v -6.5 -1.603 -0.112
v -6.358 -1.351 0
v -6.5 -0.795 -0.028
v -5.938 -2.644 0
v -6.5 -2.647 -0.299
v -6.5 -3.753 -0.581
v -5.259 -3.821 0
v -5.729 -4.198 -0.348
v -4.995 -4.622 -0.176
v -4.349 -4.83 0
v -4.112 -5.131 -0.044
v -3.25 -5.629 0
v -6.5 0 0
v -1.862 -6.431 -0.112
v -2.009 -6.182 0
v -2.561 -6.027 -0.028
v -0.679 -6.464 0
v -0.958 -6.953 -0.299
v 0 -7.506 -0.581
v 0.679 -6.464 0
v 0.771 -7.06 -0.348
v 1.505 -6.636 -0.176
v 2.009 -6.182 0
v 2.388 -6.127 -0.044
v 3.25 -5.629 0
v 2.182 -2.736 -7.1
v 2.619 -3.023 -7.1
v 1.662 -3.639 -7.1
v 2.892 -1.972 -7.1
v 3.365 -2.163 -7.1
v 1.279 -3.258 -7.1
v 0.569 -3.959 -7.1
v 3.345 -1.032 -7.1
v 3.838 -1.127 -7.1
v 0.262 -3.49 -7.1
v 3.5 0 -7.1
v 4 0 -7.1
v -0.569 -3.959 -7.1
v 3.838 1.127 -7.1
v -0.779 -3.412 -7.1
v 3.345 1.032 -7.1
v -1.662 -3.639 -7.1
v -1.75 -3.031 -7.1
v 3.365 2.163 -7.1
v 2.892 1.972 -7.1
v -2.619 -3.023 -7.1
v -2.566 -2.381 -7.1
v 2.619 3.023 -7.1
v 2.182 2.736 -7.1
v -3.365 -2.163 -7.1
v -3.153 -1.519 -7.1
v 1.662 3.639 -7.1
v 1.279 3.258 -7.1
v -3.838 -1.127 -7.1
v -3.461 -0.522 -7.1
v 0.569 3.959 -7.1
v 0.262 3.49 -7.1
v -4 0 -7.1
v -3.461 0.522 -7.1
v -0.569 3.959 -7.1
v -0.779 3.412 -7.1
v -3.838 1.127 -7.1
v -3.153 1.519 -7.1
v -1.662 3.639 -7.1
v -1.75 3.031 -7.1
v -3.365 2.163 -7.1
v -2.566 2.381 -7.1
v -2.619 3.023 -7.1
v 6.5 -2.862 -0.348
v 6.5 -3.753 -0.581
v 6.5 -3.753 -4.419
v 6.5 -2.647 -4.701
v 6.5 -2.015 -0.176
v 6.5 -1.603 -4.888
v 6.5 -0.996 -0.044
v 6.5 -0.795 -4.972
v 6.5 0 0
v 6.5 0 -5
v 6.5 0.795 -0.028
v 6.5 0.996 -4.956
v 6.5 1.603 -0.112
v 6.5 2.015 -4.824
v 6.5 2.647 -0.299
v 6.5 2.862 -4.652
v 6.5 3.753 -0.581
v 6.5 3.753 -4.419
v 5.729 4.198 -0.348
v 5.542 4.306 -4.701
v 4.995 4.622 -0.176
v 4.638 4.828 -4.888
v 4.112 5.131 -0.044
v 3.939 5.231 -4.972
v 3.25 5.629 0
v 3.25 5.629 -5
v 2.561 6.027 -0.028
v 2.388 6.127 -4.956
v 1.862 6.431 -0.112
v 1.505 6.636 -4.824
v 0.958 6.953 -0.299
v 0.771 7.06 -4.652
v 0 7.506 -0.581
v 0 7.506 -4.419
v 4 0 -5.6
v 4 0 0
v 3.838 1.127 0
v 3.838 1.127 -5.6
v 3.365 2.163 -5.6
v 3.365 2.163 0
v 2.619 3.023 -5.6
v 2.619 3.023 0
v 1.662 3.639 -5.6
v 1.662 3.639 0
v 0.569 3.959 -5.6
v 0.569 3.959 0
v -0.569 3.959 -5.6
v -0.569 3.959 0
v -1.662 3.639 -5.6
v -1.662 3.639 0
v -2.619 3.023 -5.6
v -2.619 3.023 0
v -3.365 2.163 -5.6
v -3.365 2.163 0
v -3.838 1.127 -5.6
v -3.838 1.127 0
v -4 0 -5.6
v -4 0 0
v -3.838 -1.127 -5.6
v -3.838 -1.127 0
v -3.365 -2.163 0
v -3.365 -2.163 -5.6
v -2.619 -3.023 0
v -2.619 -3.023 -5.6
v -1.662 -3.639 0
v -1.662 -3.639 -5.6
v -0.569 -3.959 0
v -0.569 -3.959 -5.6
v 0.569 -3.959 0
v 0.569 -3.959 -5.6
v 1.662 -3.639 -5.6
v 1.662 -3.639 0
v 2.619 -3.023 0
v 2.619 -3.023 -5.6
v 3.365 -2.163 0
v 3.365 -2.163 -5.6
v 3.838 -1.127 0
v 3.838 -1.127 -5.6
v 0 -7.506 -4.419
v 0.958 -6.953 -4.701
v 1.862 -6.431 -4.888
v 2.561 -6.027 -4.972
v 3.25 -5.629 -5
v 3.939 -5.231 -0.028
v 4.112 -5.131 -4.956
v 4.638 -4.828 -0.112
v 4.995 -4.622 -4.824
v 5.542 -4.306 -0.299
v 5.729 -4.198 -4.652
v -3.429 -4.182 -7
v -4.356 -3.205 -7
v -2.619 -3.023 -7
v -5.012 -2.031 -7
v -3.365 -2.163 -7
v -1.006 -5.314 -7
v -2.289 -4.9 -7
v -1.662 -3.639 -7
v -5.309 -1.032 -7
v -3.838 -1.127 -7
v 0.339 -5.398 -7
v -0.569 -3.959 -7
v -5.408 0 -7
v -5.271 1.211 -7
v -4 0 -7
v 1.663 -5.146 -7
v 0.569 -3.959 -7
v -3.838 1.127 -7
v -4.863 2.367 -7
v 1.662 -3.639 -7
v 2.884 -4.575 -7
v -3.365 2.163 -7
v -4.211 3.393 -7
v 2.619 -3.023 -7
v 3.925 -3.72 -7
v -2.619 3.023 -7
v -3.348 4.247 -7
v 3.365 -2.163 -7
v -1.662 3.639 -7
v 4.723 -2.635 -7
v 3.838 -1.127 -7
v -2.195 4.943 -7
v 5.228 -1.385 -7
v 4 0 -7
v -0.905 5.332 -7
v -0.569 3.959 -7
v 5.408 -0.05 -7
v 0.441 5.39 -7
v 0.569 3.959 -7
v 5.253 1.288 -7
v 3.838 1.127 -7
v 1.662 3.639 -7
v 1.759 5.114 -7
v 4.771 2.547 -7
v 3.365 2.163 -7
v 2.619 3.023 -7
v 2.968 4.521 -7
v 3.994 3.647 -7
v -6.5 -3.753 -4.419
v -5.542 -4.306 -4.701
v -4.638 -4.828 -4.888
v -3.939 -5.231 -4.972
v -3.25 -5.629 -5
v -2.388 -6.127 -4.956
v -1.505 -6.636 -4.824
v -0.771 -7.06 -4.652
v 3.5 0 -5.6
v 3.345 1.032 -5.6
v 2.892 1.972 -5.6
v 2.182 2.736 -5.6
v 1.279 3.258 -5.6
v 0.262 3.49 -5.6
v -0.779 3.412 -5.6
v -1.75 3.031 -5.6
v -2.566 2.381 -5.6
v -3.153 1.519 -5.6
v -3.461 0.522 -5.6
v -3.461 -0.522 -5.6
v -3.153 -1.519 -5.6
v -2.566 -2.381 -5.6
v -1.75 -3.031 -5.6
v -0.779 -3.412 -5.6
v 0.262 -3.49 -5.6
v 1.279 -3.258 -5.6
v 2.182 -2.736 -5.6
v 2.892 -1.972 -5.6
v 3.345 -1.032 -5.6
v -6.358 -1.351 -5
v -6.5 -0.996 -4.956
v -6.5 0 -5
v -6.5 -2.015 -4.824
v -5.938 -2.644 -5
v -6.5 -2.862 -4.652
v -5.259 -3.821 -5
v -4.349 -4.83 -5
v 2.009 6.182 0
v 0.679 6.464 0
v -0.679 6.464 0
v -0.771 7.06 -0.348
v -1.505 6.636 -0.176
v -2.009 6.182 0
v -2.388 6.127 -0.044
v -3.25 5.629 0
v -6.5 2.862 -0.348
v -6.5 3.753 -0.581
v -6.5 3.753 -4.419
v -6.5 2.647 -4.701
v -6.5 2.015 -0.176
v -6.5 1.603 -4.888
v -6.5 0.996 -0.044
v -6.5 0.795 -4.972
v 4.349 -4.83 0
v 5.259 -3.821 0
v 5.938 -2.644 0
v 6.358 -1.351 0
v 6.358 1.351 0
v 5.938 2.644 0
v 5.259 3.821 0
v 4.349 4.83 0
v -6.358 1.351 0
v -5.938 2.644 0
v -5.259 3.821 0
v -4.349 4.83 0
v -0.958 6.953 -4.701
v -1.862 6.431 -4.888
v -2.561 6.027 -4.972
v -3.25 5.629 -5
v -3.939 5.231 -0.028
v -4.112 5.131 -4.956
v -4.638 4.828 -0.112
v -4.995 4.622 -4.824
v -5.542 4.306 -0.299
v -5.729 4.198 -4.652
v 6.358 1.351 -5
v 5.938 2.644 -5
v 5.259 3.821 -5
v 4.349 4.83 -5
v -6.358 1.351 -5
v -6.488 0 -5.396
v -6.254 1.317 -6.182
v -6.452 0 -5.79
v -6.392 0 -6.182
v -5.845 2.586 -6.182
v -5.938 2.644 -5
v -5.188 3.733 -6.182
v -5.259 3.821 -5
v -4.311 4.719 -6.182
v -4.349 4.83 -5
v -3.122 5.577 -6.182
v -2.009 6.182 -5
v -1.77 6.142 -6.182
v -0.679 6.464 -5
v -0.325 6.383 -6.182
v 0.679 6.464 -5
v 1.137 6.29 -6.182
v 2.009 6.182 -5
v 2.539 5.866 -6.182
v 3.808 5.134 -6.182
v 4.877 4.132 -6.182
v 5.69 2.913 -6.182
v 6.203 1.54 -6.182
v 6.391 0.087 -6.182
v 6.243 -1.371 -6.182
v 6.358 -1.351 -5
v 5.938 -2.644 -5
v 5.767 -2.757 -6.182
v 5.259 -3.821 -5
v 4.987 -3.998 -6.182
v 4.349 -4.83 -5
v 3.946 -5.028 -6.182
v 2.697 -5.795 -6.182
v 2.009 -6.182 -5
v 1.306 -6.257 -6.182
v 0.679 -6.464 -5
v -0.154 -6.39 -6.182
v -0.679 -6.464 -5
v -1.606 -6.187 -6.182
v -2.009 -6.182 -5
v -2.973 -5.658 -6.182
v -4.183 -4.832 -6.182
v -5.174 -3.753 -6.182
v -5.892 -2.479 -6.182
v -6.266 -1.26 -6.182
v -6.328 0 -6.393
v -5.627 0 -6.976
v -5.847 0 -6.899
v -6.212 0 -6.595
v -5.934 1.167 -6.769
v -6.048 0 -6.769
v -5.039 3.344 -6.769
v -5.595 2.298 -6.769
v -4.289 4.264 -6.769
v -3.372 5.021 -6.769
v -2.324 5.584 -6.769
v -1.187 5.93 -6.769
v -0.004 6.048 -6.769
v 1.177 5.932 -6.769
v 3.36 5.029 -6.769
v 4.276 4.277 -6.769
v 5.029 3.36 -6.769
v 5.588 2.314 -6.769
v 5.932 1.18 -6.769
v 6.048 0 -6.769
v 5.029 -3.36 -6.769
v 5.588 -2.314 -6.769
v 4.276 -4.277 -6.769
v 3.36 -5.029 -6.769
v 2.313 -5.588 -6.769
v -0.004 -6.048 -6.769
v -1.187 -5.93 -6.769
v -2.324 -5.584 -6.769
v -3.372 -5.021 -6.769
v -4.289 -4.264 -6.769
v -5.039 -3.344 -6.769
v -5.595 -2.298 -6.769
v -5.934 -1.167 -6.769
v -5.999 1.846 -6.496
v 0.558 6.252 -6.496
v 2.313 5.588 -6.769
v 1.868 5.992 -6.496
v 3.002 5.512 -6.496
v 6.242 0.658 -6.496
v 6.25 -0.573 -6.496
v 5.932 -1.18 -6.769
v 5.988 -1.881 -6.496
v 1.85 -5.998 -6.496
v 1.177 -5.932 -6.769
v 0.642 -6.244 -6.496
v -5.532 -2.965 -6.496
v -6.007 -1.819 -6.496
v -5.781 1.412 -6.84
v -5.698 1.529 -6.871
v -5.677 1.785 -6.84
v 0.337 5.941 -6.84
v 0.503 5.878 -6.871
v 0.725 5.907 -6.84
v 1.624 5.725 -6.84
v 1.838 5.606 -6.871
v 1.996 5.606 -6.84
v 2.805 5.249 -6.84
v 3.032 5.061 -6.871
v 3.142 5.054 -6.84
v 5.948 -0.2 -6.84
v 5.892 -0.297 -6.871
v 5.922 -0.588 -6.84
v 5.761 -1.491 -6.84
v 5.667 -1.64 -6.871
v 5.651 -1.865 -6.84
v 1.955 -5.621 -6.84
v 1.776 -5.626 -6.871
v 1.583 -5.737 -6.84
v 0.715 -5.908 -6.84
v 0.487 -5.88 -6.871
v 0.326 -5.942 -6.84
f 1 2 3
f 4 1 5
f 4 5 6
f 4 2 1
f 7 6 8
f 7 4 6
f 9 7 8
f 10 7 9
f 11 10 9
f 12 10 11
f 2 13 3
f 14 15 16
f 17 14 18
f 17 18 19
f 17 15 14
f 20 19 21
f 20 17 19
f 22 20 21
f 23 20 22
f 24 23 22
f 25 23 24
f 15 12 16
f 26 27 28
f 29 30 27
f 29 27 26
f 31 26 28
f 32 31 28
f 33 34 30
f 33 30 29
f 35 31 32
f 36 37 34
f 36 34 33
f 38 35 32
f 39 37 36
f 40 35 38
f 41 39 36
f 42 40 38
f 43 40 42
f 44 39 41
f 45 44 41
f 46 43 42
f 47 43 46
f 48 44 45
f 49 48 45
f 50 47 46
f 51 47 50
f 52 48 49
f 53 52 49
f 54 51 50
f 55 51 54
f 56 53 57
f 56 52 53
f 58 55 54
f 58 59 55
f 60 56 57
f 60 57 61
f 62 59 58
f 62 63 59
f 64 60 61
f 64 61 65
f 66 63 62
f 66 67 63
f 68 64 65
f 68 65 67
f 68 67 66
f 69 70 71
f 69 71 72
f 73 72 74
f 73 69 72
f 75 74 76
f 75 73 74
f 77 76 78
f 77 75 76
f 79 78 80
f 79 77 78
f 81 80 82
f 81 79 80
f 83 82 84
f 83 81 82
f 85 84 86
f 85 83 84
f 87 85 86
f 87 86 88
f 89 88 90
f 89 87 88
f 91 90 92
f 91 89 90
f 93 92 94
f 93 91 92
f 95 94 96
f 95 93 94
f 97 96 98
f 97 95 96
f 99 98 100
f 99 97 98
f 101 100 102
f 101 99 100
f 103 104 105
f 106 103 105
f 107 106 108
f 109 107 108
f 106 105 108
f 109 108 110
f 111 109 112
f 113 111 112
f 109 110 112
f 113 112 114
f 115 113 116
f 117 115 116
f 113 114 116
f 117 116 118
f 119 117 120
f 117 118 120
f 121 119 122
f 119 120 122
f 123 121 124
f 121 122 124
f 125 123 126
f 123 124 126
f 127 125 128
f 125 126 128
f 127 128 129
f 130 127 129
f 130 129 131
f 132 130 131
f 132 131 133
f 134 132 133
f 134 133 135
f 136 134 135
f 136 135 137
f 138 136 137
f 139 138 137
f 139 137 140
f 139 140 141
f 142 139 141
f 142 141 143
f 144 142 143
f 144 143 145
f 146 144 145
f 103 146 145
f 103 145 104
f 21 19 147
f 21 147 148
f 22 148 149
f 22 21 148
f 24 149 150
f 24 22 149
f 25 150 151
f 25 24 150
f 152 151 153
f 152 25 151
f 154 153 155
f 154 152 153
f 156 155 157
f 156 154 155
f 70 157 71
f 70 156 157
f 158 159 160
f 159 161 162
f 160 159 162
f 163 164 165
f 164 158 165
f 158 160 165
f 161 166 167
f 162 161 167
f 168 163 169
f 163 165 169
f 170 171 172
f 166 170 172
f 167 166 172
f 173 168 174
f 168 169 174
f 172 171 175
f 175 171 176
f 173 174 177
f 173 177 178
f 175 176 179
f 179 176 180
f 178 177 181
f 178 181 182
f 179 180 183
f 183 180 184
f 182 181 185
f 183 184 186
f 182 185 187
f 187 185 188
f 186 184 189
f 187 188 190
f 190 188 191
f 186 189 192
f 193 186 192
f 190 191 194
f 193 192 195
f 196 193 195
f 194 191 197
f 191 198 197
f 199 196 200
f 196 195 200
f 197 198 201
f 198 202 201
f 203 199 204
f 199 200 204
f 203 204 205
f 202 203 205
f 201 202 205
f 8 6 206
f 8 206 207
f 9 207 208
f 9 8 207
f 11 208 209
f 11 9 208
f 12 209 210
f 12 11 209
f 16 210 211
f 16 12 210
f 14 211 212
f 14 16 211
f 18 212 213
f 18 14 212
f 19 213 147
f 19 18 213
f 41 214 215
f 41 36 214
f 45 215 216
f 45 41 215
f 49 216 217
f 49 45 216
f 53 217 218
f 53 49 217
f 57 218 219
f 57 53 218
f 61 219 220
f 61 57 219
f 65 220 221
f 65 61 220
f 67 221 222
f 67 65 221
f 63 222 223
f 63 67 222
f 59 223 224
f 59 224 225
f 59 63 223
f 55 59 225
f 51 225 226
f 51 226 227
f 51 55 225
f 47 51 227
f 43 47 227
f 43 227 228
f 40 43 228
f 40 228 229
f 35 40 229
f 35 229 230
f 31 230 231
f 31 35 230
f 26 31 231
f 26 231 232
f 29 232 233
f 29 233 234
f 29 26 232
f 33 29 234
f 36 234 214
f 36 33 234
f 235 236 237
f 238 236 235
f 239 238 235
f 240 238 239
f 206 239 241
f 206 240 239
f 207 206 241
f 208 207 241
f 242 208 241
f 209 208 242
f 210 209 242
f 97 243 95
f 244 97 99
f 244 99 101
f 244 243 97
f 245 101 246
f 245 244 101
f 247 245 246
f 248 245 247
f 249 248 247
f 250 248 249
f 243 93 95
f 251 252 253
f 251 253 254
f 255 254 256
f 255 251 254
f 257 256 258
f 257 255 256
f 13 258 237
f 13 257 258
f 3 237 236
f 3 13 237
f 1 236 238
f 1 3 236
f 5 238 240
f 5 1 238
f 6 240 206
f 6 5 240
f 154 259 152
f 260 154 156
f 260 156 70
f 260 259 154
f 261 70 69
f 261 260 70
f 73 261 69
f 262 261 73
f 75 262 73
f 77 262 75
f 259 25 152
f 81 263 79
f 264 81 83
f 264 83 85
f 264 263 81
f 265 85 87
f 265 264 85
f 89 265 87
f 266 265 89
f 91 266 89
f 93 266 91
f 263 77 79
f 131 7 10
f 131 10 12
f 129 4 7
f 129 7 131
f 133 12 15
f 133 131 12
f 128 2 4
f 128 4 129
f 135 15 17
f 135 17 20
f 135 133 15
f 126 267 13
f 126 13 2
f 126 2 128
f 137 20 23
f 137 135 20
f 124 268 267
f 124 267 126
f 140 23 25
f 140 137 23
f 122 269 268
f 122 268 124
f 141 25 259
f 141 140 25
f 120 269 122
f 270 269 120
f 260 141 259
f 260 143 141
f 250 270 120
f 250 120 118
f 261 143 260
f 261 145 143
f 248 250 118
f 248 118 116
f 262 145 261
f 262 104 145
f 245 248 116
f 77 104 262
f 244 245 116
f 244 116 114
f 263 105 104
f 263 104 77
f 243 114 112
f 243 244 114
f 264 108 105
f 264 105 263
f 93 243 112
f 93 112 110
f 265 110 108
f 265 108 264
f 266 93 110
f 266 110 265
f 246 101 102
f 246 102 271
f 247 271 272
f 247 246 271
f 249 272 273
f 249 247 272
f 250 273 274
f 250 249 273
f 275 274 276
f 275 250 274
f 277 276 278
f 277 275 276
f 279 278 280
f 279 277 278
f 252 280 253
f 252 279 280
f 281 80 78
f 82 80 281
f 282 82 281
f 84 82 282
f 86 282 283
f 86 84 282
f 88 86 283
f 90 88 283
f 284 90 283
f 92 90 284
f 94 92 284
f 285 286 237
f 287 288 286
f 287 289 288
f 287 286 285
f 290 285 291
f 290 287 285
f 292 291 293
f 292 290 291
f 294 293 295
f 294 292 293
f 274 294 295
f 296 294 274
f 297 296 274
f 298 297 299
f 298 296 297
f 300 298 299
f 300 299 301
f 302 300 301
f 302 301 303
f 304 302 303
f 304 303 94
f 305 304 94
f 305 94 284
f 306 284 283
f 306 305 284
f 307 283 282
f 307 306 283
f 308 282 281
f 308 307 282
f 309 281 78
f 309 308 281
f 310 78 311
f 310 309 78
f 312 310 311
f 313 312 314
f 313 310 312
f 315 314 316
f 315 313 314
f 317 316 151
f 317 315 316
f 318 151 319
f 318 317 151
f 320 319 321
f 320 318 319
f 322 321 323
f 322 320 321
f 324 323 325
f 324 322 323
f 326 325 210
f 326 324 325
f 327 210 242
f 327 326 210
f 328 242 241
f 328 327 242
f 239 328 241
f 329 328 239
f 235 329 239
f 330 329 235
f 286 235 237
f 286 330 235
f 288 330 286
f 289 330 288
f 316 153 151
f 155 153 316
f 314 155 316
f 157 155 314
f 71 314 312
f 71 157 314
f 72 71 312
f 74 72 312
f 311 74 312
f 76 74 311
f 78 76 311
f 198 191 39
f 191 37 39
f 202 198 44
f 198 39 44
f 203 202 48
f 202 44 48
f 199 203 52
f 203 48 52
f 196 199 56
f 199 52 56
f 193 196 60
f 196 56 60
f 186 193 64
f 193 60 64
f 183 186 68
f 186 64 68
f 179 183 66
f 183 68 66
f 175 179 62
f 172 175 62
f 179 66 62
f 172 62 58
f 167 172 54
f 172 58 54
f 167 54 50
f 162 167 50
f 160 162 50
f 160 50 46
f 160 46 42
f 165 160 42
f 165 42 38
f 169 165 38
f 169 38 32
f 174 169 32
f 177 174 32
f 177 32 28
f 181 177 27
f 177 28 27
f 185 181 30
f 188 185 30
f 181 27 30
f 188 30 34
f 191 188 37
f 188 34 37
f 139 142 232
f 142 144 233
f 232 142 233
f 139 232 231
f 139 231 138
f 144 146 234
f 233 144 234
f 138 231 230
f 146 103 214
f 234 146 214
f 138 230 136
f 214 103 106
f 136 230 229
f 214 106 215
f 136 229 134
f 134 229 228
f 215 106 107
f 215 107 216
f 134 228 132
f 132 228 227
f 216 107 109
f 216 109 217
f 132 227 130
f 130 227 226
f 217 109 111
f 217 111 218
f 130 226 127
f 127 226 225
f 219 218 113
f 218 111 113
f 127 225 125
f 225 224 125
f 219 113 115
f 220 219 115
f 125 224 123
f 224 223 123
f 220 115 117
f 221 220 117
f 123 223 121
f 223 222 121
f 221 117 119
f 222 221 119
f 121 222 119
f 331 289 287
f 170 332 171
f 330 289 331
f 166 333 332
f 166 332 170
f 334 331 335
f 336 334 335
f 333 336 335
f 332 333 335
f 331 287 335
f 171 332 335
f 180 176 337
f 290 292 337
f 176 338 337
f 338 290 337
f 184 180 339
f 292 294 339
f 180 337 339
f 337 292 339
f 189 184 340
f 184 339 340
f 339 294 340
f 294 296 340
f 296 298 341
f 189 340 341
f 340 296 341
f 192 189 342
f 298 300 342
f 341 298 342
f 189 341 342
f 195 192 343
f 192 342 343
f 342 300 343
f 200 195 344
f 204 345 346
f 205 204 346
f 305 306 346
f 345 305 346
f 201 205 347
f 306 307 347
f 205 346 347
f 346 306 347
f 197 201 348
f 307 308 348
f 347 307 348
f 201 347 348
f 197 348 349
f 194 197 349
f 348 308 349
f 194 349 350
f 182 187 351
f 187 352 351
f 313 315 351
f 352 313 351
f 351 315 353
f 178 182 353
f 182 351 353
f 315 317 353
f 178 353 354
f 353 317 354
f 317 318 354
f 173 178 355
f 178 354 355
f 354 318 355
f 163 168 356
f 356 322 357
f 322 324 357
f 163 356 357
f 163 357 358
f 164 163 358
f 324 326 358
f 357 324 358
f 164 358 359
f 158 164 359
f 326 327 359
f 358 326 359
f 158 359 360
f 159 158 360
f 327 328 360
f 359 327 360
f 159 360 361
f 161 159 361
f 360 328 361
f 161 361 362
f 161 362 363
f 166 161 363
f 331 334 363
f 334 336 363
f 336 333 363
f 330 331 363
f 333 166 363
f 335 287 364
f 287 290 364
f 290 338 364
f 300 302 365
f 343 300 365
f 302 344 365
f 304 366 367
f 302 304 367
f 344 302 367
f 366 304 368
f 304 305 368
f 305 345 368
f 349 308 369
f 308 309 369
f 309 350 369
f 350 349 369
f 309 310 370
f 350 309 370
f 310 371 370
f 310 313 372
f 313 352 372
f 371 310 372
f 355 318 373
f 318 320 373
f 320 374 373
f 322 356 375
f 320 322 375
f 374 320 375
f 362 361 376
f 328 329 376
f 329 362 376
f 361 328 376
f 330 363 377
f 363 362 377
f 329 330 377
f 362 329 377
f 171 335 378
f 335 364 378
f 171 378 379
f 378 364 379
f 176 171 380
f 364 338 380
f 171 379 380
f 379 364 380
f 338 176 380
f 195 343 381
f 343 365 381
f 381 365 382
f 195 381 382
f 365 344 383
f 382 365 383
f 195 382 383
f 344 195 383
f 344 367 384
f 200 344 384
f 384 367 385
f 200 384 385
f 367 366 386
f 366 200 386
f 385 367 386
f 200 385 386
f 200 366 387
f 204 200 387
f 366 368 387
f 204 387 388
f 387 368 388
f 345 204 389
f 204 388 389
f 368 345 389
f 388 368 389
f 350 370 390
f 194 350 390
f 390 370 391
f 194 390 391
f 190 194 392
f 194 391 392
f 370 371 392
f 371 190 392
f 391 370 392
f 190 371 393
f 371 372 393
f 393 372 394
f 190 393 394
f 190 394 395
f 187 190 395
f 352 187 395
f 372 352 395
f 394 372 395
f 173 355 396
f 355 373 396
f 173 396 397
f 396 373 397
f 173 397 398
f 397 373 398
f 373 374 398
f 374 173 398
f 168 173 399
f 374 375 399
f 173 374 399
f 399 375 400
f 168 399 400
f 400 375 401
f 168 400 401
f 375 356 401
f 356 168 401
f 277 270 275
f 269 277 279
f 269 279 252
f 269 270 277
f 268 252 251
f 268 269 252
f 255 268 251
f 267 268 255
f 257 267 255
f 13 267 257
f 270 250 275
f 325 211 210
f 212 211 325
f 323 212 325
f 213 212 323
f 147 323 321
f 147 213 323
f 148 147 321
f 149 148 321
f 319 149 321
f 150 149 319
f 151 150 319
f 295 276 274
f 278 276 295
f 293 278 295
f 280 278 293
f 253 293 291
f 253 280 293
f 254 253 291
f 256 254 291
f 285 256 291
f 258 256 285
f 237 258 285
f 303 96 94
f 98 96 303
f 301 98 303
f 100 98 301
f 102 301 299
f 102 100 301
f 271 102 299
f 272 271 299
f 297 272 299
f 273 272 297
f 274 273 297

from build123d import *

# Parameters (mm, degrees)
BASE_EXTRUSION_DEPTH    = 5
ENL_V_MAT_EXTRU_2_DEPTH = 13.148388096
CONG_1_R                = 1
ESQUISSE3_R             = 4
ENL_V_MAT_EXTRU_1_DEPTH = 13.148388154
ESQUISSE6_W             = 0.5
ESQUISSE6_H             = 1.5


with BuildPart() as part:
    # Esquisse1 → Base-Extrusion (new body)
    with BuildSketch(Plane.XY):
        Polygon((6.5, -3.75277675), (6.5, 3.75277675), (0, 7.505553499), (-6.5, 3.75277675), (-6.5, -3.75277675), (0, -7.505553499), align=None)
    extrude(amount=-BASE_EXTRUSION_DEPTH)

    # Esquisse2 → Enlèvement de matière-Révolution1 (revolve, cut)
    with BuildSketch(Plane(origin=(0, 0, 0), x_dir=(1, 0, 0), z_dir=(0, 1, 0))):
        Polygon((-6.5, 0), (-11.830127019, 0), (-11.830127019, 5), (-6.5, 5), (-10.830127019, 2.5), align=None)
    revolve(axis=Axis((0, 0, -5), (0, 0, 1)), mode=Mode.SUBTRACT)

    # Esquisse4 → Boss.-Révol.1 (revolve)
    with BuildSketch(Plane(origin=(0, 0, 0), x_dir=(1, 0, 0), z_dir=(0, 1, 0))):
        with BuildLine():
            Line((0, 11.5), (0, 5))
            Line((0, 5), (-6.5, 5))
            ThreePointArc((-6.5, 5), (-4.596194078, 9.596194078), (0, 11.5))
        make_face()
    revolve(axis=Axis((0, 0, 0), (0, 0, -1)))

    # Esquisse5 → Enlèv. mat.-Extru.2 (cut, through all)
    with BuildSketch(Plane.XY.offset(-7)):
        with BuildLine():
            ThreePointArc((6.5, 0), (5.629165125, 3.25), (3.25, 5.629165125))
            ThreePointArc((3.25, 5.629165125), (0, 6.5), (-3.25, 5.629165125))
            ThreePointArc((-3.25, 5.629165125), (-5.629165125, 3.25), (-6.5, 0))
            ThreePointArc((-6.5, 0), (-5.629165125, -3.25), (-3.25, -5.629165125))
            ThreePointArc((-3.25, -5.629165125), (0, -6.5), (3.25, -5.629165125))
            ThreePointArc((3.25, -5.629165125), (5.629165125, -3.25), (6.5, 0))
        make_face()
    extrude(amount=-ENL_V_MAT_EXTRU_2_DEPTH, mode=Mode.SUBTRACT)

    # Congé1
    cong_1_edges = [part.edges().sort_by_distance(p)[0] for p in [
        (6.184658438, 0, -7),
    ]]
    fillet(cong_1_edges, radius=CONG_1_R)

    # Esquisse3 → Enlèv. mat.-Extru.1 (cut, through all)
    with BuildSketch(Plane.XY):
        Circle(ESQUISSE3_R)
    extrude(amount=-ENL_V_MAT_EXTRU_1_DEPTH, mode=Mode.SUBTRACT)

    # Esquisse6 → Révolution2 (revolve)
    with BuildSketch(Plane(origin=(0, 0, 0), x_dir=(1, 0, 0), z_dir=(0, 1, 0))):
        with Locations((3.75, 6.35)):
            Rectangle(ESQUISSE6_W, ESQUISSE6_H)
    revolve(axis=Axis((0, 0, -32.444892216), (0, 0, 1)))


solid = part.part
